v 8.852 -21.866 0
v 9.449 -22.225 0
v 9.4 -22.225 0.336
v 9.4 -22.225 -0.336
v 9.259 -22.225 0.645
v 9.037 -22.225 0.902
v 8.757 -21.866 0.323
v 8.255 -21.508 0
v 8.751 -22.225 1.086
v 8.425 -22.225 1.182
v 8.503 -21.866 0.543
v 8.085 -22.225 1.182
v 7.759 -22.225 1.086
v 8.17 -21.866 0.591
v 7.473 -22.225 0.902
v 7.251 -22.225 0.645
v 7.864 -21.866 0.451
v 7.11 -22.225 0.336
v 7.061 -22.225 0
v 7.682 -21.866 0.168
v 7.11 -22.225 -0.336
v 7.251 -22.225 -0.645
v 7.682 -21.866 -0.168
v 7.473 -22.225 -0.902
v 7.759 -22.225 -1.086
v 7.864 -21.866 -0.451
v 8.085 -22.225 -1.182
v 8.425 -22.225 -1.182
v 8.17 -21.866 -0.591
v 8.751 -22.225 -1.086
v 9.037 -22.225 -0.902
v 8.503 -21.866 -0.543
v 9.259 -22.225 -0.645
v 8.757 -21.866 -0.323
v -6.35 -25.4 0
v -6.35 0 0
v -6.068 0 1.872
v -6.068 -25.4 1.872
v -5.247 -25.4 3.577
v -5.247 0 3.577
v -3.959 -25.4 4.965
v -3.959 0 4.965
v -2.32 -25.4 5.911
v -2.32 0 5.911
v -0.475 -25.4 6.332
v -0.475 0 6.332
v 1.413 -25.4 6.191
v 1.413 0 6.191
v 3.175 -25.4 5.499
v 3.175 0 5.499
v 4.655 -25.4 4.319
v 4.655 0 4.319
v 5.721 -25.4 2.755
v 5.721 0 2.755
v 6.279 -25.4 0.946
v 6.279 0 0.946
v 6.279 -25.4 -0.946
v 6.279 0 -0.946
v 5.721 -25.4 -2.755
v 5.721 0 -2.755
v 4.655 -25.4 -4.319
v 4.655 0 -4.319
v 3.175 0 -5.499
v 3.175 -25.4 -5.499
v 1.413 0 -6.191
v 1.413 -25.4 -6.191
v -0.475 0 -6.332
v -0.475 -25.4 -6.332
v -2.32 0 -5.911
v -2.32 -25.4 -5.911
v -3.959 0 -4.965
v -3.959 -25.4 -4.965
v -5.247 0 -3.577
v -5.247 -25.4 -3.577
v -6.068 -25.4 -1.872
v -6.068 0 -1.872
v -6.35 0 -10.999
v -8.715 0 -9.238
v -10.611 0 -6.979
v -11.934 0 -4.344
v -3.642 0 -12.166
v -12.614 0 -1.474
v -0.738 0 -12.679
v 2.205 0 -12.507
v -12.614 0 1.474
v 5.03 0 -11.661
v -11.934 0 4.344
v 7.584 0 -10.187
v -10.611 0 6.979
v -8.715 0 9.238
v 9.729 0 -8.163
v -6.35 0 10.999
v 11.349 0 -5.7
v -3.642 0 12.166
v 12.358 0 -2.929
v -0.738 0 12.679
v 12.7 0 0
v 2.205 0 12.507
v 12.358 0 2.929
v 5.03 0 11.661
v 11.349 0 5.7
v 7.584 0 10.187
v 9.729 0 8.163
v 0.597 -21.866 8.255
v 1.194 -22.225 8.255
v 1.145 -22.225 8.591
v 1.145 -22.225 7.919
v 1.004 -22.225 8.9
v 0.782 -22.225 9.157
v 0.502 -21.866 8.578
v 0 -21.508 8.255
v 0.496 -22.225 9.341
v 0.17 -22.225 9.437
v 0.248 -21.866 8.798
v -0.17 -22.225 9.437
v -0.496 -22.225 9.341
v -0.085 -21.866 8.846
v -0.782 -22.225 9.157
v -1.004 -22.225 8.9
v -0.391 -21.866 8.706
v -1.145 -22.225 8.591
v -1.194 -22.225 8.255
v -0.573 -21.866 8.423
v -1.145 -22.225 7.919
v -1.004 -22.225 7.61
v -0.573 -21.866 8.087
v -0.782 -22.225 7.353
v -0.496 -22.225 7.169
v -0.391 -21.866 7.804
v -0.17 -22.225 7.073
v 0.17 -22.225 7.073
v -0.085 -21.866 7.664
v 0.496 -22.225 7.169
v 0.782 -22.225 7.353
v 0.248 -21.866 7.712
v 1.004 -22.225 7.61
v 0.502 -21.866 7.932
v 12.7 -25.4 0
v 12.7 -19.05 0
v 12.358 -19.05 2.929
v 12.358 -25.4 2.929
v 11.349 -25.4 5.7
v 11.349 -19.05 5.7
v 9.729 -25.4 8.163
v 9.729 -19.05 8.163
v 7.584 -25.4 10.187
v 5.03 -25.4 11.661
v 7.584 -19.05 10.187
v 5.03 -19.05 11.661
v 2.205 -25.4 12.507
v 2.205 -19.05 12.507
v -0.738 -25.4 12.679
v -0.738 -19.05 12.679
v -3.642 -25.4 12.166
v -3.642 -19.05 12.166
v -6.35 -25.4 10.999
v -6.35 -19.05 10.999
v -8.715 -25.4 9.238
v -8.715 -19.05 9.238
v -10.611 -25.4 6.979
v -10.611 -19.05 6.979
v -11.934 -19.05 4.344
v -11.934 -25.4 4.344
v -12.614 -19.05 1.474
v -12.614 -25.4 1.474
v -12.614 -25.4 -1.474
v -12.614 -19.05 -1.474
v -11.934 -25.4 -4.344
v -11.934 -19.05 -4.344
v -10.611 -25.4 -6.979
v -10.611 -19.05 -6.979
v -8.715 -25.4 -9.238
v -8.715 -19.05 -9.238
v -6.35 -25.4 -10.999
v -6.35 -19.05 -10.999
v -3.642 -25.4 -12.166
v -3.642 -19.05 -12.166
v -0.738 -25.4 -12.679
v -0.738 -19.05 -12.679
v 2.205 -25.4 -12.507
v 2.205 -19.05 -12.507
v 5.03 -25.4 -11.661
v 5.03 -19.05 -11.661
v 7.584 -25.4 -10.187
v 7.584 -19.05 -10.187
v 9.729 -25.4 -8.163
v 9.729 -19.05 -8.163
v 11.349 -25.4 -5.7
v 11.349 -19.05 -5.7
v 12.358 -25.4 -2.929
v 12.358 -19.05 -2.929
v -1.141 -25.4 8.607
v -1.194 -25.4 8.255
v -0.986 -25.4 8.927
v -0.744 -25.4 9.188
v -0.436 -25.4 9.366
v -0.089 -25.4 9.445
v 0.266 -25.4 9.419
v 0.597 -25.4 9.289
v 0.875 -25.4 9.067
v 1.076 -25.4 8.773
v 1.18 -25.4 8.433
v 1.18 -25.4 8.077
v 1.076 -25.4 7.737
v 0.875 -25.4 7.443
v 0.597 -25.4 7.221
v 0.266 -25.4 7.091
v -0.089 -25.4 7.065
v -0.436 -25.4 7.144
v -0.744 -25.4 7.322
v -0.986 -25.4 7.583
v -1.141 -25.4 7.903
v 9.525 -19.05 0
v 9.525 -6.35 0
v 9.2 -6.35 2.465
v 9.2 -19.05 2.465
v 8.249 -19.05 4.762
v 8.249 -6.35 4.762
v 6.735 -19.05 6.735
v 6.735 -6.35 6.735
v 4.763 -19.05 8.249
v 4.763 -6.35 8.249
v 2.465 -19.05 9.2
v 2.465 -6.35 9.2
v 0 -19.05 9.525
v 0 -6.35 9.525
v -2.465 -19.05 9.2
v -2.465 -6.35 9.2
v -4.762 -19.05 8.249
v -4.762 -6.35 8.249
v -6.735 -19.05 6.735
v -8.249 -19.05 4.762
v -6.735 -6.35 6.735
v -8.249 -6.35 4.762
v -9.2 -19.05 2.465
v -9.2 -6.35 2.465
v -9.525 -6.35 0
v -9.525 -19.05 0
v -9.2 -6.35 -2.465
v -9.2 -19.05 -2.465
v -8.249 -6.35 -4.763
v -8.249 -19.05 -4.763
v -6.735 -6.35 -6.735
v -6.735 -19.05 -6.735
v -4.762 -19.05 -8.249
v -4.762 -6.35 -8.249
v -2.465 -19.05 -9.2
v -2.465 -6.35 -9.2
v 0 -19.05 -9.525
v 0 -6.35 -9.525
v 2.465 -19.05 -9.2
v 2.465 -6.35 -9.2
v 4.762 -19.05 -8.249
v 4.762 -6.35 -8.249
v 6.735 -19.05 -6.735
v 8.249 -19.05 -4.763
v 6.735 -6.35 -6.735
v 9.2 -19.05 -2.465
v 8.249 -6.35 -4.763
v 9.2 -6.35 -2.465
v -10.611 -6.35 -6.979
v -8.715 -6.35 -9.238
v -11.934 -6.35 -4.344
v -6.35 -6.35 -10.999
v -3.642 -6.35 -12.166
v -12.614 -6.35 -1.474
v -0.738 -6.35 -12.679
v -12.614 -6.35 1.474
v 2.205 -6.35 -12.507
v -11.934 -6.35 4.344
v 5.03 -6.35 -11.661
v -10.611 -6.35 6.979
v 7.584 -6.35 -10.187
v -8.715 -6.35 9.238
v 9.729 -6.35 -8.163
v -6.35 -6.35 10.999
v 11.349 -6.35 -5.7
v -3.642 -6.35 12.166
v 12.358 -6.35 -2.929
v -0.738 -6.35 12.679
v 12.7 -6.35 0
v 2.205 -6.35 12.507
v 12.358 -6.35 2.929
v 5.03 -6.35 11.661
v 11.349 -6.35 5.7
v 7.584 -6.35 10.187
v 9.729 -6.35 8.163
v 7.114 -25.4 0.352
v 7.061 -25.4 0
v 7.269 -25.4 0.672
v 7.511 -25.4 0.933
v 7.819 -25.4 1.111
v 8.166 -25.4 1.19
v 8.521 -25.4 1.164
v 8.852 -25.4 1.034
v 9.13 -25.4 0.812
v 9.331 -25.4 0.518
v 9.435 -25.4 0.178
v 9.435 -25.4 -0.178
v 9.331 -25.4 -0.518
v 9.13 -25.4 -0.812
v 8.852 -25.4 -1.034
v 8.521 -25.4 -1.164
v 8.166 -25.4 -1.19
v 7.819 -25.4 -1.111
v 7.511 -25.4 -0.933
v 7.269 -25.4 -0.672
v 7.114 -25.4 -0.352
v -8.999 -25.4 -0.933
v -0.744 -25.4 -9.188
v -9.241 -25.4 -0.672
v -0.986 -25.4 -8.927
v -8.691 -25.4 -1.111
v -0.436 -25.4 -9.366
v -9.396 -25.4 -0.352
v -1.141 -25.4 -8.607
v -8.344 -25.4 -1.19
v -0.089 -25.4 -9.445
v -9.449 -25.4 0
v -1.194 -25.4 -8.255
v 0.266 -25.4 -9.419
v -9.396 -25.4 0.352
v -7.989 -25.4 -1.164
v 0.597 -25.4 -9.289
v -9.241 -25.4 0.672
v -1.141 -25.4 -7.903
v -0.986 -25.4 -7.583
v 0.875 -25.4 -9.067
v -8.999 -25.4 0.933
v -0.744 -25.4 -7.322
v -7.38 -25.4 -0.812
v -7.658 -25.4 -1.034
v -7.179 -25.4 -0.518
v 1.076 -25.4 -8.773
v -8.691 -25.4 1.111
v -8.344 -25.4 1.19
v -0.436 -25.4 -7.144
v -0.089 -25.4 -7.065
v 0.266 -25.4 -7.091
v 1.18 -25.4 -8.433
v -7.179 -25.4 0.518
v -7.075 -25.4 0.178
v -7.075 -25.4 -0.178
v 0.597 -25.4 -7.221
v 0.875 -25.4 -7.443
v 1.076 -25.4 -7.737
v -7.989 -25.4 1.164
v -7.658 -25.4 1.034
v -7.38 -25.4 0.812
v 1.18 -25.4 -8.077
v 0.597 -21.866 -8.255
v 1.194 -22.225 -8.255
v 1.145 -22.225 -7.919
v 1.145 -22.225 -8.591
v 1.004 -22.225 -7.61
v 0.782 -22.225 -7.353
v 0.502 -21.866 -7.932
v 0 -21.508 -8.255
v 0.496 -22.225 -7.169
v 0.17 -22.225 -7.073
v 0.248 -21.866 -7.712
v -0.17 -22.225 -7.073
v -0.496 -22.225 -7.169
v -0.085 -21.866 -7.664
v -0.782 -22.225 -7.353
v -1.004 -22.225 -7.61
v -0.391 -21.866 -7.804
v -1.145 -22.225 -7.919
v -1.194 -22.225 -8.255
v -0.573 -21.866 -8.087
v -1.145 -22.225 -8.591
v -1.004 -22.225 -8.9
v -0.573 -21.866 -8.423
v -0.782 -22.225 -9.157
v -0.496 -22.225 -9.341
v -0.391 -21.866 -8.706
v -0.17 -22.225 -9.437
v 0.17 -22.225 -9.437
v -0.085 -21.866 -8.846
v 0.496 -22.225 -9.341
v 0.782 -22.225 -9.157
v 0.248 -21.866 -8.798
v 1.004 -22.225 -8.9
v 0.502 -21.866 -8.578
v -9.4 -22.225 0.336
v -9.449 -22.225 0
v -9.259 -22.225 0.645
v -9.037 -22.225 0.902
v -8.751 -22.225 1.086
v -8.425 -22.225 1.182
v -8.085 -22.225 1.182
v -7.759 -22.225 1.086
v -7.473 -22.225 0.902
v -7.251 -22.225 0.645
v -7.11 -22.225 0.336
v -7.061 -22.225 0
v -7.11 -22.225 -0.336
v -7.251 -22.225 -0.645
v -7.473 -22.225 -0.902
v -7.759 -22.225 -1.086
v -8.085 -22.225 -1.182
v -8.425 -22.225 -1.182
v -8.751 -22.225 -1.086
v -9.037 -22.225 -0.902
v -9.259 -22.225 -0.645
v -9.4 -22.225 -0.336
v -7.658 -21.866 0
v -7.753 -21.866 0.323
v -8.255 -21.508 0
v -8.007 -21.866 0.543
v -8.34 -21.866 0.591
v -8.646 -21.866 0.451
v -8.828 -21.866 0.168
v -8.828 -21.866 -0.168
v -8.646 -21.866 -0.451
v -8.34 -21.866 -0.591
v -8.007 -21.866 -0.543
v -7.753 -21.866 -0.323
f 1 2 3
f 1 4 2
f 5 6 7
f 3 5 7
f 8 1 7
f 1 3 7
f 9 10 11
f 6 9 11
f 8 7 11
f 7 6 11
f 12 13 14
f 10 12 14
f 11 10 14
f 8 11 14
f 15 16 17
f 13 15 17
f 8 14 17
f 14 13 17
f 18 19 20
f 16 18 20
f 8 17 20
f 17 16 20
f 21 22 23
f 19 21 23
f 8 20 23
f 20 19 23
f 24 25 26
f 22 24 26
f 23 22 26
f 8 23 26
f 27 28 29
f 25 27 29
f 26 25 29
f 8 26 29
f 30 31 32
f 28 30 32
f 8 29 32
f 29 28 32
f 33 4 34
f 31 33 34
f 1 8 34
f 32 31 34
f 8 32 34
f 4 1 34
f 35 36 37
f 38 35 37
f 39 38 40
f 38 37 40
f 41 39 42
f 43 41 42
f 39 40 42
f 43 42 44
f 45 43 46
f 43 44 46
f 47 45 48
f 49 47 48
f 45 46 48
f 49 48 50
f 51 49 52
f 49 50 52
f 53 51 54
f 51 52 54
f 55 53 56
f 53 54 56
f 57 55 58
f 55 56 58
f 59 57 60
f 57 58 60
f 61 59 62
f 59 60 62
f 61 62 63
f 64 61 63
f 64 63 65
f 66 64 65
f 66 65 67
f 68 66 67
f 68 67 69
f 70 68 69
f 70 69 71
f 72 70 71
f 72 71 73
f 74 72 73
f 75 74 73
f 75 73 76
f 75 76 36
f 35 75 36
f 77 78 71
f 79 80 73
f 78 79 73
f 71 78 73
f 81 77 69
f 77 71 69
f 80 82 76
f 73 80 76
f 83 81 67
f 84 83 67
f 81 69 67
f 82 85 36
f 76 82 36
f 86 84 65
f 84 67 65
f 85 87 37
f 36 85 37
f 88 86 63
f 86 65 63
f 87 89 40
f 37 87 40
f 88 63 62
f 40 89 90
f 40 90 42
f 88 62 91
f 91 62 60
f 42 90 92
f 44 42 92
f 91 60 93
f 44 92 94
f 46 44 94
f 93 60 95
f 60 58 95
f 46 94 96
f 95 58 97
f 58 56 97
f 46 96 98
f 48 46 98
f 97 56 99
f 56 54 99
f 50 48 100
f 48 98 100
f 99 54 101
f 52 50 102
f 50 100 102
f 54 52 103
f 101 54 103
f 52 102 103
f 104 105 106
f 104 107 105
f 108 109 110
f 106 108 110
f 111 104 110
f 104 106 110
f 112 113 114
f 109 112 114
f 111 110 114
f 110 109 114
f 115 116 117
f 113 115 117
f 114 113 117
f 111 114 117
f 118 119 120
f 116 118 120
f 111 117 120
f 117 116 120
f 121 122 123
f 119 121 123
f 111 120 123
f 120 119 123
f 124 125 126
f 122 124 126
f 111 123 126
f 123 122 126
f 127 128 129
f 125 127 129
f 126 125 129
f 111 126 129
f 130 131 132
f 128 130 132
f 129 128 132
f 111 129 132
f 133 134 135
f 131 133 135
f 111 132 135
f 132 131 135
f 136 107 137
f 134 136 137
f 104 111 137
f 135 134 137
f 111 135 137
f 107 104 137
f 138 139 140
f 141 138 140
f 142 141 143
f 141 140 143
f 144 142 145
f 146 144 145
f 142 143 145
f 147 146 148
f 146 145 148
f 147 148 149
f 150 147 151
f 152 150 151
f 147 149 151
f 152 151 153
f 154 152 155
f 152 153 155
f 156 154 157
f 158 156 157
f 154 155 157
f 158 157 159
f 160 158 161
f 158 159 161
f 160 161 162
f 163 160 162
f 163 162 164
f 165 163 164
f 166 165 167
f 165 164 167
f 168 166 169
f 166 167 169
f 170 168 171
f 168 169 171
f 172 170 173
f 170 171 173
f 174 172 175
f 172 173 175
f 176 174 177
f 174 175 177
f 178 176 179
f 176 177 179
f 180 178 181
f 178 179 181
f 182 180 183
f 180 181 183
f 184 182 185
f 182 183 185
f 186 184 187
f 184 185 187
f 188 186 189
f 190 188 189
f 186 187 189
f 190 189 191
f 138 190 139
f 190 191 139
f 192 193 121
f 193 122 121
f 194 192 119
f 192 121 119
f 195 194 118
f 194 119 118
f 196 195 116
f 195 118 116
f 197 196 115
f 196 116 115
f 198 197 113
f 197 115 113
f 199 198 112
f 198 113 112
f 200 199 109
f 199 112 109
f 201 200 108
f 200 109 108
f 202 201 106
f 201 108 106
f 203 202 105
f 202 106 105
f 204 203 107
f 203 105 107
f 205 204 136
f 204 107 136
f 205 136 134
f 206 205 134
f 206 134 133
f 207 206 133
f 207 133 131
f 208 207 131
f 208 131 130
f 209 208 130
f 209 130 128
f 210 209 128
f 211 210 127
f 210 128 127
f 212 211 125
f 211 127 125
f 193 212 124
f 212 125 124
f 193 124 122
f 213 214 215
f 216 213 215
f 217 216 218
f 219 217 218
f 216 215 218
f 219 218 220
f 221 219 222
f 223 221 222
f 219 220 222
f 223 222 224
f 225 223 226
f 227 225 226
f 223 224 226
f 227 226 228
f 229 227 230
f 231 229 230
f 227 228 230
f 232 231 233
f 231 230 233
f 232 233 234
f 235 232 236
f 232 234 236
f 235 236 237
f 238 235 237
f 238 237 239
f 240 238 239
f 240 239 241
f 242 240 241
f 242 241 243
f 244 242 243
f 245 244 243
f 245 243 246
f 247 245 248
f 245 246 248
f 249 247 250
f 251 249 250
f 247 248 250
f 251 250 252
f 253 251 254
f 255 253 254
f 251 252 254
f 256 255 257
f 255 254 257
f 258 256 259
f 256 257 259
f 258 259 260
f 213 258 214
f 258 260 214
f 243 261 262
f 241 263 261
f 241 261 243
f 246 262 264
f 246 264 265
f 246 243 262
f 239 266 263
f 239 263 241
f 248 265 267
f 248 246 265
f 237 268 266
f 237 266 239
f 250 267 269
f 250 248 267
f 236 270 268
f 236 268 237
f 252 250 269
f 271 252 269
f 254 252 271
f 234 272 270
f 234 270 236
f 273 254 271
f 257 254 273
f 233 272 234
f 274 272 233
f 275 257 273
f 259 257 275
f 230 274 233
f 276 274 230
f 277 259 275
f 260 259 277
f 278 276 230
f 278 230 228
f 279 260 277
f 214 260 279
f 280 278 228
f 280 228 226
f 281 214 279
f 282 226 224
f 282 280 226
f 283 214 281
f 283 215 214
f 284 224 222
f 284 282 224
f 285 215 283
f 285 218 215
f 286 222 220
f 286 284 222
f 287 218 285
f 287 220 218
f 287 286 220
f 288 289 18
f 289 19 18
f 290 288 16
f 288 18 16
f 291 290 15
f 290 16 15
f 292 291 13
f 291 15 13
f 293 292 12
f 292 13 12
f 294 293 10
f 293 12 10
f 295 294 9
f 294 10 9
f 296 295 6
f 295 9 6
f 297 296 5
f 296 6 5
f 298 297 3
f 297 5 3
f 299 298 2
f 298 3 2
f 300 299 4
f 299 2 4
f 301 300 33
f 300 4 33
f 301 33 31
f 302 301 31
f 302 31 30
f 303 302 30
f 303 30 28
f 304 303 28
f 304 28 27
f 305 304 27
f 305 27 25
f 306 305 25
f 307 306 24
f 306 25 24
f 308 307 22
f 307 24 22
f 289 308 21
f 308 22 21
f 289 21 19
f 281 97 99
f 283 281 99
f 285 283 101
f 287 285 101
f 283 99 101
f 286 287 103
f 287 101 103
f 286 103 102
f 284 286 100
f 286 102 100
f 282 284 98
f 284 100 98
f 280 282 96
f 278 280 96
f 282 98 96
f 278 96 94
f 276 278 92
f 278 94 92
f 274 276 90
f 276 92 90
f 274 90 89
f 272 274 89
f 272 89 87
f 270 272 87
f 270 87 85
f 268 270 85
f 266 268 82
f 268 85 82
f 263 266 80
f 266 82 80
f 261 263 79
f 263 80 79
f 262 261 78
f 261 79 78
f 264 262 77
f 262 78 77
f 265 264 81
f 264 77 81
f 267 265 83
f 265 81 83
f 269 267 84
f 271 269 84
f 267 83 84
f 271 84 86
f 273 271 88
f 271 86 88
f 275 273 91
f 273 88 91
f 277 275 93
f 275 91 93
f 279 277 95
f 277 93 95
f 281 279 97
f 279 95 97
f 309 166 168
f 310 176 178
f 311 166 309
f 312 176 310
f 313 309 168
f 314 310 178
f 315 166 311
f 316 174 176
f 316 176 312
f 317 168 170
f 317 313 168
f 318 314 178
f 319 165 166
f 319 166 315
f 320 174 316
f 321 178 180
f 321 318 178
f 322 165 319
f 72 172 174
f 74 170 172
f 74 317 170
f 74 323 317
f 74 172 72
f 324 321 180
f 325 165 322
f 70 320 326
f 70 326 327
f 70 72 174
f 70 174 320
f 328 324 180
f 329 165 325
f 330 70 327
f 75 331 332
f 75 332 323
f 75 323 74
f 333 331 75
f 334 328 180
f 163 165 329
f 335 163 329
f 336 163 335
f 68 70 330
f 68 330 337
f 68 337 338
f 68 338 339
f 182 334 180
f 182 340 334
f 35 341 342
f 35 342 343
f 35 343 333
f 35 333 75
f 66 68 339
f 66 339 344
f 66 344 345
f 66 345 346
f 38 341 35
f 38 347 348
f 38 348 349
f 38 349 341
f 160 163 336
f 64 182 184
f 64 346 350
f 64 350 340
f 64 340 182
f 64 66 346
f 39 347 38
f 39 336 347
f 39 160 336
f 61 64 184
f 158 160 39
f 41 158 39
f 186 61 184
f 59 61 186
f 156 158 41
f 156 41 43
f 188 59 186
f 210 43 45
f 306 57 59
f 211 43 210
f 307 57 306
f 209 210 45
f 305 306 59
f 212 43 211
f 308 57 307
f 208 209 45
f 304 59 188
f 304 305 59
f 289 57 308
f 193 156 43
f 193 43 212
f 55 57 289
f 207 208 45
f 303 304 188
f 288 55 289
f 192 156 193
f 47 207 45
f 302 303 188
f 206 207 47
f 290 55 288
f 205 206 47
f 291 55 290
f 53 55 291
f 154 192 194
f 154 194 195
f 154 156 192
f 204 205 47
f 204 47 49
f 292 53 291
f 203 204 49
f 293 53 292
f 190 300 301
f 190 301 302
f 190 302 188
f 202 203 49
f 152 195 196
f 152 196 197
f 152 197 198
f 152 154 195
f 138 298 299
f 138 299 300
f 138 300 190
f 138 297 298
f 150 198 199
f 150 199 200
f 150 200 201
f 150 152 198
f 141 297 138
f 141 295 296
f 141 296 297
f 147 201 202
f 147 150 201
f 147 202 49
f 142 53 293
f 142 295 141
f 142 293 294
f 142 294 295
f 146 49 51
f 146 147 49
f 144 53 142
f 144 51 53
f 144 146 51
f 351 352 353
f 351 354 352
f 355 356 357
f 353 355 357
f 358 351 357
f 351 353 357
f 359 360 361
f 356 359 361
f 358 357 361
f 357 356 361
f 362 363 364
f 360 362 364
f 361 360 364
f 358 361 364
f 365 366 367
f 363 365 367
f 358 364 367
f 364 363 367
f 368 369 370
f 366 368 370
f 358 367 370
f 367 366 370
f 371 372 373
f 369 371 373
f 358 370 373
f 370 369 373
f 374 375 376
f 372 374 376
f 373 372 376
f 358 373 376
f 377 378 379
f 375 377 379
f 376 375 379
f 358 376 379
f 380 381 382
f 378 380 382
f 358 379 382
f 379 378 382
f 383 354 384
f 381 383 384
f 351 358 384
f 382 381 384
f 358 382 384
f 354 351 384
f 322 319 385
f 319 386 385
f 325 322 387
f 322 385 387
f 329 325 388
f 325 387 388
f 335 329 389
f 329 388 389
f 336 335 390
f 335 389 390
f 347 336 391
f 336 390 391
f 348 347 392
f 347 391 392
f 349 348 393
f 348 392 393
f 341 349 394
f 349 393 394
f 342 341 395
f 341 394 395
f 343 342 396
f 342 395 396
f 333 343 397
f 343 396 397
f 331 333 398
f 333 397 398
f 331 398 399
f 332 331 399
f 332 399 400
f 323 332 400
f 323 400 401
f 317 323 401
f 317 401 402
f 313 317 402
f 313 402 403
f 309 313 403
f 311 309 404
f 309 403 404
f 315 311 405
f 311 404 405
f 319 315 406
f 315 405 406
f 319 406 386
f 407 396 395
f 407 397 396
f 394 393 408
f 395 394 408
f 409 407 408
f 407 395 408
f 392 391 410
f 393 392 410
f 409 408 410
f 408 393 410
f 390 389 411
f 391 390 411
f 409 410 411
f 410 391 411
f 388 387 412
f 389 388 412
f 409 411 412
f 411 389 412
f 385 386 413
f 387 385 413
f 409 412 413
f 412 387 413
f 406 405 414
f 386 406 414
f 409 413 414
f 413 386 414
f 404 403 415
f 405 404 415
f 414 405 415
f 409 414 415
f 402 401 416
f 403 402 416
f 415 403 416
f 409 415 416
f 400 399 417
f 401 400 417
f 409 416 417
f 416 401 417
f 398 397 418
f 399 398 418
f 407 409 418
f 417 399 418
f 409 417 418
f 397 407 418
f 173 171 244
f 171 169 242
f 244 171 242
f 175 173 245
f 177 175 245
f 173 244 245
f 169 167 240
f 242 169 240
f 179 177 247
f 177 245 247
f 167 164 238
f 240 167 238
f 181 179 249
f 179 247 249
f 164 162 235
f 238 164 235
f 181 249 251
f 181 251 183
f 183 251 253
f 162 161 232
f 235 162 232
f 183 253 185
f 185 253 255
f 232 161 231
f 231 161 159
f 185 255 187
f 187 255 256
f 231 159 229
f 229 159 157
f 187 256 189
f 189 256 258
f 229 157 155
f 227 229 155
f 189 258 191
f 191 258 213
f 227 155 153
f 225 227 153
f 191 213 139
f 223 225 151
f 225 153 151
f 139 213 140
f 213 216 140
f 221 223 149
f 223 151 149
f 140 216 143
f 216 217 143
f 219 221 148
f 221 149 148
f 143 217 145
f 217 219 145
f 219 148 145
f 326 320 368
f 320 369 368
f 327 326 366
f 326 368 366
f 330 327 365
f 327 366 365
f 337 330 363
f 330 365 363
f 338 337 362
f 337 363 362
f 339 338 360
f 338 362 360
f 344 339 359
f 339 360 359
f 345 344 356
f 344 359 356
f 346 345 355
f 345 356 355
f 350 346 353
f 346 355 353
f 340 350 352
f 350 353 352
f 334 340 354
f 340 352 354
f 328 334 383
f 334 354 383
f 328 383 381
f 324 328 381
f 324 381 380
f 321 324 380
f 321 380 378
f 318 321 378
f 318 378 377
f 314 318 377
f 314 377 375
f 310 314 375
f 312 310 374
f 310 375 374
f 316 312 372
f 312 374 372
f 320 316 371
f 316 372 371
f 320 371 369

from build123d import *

# Parameters (mm, degrees)
F0_R     = 12.7
F1_DEPTH = 6.35
F2_R     = 9.525
F3_DEPTH = 12.7
F4_R     = 12.7
F5_DEPTH = 6.35
F7_D     = 2.3876
F7_DEPTH = 3.175
F7_TIP   = 0.717307407
F9_D     = 12.7


with BuildPart() as f1:
    # F0 (on Front) → F1 (new body)
    with BuildSketch(Plane.XZ):
        Circle(F0_R)
    extrude(amount=F1_DEPTH)

    # F2 (on face) → F3 (join)
    with BuildSketch(Plane.XZ.offset(6.35)):
        Circle(F2_R)
    extrude(amount=F3_DEPTH)

    # F4 (on face) → F5 (join)
    with BuildSketch(Plane.XZ.offset(19.05)):
        Circle(F4_R)
    extrude(amount=F5_DEPTH)

    # F7
    with Locations(Plane.XZ.offset(25.4)):
        with Locations((-8.255, 0), (0, 8.255), (8.255, 0), (0, -8.255)):
            Hole(F7_D / 2, depth=F7_DEPTH)
            with Locations((0, 0, -(F7_DEPTH + F7_TIP / 2))):  # 118° drill point
                Cone(0, F7_D / 2, F7_TIP, mode=Mode.SUBTRACT)

    # F9 (through all)
    with Locations(Plane.XZ.offset(25.4)):
        with Locations((0, 0)):
            Hole(F9_D / 2)


solid = f1.part
